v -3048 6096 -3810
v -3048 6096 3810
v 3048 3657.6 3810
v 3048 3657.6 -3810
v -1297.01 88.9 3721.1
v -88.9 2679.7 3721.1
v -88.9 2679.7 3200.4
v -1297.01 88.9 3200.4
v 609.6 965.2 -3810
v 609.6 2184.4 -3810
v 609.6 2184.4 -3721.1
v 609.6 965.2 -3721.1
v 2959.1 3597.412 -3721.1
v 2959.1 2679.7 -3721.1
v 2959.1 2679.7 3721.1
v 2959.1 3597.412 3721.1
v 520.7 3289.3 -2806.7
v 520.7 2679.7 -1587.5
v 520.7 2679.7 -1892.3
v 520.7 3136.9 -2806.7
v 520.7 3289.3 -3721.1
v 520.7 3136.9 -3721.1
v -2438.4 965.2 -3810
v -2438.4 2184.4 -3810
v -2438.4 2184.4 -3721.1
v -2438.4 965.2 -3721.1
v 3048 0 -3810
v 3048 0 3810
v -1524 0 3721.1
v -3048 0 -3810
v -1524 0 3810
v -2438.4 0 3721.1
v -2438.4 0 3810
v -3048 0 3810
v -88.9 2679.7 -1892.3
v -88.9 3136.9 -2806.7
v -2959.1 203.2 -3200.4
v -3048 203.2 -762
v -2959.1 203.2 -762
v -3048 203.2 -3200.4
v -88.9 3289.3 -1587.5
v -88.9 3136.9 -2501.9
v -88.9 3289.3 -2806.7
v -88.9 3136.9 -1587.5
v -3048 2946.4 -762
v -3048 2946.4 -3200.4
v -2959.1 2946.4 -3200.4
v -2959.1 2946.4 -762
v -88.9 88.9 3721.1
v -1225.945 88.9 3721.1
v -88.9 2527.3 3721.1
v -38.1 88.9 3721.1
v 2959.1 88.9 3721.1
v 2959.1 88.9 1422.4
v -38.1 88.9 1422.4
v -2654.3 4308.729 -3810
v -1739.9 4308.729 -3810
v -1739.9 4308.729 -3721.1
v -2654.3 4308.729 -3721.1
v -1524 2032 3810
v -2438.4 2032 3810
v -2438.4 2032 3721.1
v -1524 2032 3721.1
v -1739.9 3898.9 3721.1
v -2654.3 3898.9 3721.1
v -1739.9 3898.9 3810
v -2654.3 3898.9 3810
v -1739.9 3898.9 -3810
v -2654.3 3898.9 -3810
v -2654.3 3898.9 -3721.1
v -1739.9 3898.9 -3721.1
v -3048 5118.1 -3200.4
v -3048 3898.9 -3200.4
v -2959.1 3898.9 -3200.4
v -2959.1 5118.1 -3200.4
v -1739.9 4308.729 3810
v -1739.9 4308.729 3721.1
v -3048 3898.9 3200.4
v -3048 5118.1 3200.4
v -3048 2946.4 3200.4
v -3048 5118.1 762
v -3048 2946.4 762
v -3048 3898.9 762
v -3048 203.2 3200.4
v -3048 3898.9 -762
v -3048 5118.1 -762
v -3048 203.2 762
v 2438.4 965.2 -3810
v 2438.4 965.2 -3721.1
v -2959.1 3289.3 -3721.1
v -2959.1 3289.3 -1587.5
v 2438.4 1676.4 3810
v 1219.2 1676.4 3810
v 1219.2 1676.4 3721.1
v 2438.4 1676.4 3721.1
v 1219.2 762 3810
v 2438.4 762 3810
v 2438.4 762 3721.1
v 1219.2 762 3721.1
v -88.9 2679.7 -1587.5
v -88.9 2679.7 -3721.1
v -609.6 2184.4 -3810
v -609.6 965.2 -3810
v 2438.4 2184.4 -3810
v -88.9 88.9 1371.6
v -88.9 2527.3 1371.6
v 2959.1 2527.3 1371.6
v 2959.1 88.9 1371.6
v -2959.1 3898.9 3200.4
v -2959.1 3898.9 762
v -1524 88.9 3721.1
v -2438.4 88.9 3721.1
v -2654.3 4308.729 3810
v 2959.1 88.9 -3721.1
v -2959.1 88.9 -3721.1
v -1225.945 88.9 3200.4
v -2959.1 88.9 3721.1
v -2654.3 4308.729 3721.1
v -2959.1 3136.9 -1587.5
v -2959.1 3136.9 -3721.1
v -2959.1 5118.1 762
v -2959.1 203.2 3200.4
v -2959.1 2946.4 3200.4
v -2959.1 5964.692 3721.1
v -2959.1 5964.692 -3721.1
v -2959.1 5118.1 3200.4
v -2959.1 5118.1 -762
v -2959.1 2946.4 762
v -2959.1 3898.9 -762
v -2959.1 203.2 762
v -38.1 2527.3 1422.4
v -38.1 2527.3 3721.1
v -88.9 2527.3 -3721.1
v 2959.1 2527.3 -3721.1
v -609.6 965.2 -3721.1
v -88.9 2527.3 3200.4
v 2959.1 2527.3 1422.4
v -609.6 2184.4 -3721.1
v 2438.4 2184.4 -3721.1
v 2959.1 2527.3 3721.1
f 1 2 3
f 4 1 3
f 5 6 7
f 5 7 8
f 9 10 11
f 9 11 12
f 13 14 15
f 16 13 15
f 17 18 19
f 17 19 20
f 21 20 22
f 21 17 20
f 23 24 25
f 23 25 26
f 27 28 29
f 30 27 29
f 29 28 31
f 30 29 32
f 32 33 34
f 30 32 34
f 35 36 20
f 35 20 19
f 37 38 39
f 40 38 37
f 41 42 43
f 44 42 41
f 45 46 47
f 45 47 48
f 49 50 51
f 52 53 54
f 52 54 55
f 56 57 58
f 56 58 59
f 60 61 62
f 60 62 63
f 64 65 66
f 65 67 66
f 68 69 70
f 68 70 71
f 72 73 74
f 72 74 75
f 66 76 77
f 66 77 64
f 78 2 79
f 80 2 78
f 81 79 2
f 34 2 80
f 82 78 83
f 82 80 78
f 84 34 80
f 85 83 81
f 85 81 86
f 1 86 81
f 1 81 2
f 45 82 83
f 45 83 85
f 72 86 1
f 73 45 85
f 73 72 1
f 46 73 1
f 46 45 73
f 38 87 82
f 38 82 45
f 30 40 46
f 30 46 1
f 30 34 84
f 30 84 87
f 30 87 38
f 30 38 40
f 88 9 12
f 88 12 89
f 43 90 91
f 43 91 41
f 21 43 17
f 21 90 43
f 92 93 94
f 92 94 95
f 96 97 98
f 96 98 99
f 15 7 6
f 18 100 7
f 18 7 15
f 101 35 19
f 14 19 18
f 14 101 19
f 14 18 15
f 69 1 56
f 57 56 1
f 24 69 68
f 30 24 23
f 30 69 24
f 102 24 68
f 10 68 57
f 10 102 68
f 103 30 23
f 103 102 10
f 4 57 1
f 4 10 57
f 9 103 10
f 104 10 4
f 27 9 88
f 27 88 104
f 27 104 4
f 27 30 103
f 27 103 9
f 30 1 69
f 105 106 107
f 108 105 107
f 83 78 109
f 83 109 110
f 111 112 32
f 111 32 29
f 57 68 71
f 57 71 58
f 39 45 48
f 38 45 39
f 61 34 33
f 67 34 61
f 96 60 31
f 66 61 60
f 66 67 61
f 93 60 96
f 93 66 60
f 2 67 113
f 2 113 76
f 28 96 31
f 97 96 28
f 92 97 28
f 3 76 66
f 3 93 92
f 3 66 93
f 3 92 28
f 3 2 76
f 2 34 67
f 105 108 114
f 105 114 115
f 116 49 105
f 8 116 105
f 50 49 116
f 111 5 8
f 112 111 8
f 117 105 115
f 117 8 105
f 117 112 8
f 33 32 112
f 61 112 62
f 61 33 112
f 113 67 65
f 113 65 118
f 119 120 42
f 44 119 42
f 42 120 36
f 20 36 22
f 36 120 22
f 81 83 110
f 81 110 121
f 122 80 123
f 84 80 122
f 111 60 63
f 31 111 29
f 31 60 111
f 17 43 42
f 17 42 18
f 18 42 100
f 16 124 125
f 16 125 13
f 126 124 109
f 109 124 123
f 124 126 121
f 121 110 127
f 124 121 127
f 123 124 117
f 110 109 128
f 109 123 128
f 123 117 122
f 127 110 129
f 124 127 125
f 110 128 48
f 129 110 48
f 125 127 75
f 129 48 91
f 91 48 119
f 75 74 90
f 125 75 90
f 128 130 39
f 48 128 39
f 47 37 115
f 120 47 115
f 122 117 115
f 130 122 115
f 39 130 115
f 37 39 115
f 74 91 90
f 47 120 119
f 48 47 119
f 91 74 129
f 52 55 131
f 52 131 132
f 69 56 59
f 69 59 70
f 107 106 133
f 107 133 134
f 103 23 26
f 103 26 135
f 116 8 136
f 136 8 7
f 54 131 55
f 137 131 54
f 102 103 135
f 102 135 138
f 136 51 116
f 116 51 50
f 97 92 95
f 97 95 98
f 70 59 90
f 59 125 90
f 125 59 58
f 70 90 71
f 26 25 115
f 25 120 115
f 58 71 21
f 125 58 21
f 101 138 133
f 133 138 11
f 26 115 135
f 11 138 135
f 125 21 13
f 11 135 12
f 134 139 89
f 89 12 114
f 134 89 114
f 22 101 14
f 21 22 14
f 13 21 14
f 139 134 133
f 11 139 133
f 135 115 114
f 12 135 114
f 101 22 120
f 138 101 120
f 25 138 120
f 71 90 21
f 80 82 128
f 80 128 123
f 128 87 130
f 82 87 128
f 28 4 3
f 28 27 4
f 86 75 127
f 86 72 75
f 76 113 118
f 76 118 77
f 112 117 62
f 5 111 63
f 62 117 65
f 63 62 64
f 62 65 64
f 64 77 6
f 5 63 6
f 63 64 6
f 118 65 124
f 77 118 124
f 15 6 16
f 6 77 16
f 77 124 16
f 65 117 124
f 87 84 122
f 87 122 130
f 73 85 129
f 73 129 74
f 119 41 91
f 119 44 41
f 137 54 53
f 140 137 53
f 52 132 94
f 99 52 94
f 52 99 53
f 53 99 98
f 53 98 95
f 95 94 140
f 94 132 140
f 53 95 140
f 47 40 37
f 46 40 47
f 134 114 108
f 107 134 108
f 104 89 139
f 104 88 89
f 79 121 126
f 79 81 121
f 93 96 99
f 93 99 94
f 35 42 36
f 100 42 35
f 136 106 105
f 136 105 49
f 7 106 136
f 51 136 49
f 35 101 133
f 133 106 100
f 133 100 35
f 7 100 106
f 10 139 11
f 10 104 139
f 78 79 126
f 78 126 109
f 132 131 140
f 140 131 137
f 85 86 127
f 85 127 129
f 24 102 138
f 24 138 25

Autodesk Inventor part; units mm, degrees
ref_plane "YZ Plane" through (0, 0, 0) normal (1, 0, 0) x (0, 1, 0)
sketch "Sketch1" plane through (0, 0, 0) normal (0, 1, 0) x (-1, 0, 0)
  line L0 (-3048, 3810) -> (3048, 3810)
  line L1 (3048, 3810) -> (3048, -3810)
  line L2 (3048, -3810) -> (-3048, -3810)
  line L3 (-3048, -3810) -> (-3048, 3810)
  line L4 (-3048, 3810) -> (3048, -3810) construction
  line L5 (3048, 3810) -> (-3048, -3810) construction
  point P0 (0, 0)
  dimension "d0" = 7620
  dimension "d1" = 6096
extrude "main body" add sketch "Sketch1" along normal blind 3657.6
sketch "Sketch3" plane through (0, 0, 0) normal (0, 0, 1) x (1, 0, 0)
  line L0 (-3048, 3657.6) -> (-3048, 6096)
  line L1 (-3048, 6096) -> (3048, 3657.6)
  line L2 (3048, 3657.6) -> (-3048, 3657.6)
  point P0 (0, 0)
  dimension "d4" = 2438.4
extrude "triangle" add sketch "Sketch3" along normal mid plane 7620
shell "Shell1" thickness 88.9 removed faces 1 at (-1016, 3251.2, 3810)
ref_plane "Work Plane1" through (-2959.1, 2527.3, 3810) normal (0, 1, 0) x (1, 0, 0)
sketch "Sketch6" plane through (-2959.1, 2527.3, 3810) normal (0, 1, 0) x (1, 0, 0)
  line L0 (5918.2, 0) -> (2870.2, 0)
  line L1 (2870.2, 0) -> (2870.2, 7531.1)
  line L2 (2870.2, 7531.1) -> (5918.2, 7531.1)
  line L3 (5918.2, 7531.1) -> (5918.2, 0)
  point P0 (2959.1, 3810)
  dimension "d12" = 3048
extrude "second floor" add sketch "Sketch6" along normal blind 152.4
ref_plane "Work Plane3" through (-2959.1, 3136.9, 3810) normal (0, 1, 0) x (1, 0, 0)
sketch "Sketch8" plane through (-2959.1, 3136.9, 3810) normal (0, 1, 0) x (1, 0, 0)
  line L0 (0, 7531.1) -> (2870.2, 7531.1)
  line L1 (2870.2, 7531.1) -> (2870.2, 5397.5)
  line L2 (2870.2, 5397.5) -> (0, 5397.5)
  line L3 (0, 5397.5) -> (0, 7531.1)
  line L4 (2870.2, 7531.1) -> (2870.2, 0) projected
  line L5 (0, 0) -> (0, 7531.1) projected
  line L6 (2870.2, 7531.1) -> (3479.8, 7531.1)
  line L7 (3479.8, 7531.1) -> (3479.8, 6616.7)
  line L8 (3479.8, 6616.7) -> (2870.2, 6616.7)
  line L9 (2870.2, 6616.7) -> (2870.2, 7531.1)
  point P0 (2959.1, 3810)
  dimension "d17" = 0
  dimension "d19" = 0
  dimension "d20" = 2133.6
  dimension "d23" = 0
  dimension "d39" = 609.6
  dimension "d40" = 914.4
extrude "bedroom" add sketch "Sketch8" along normal blind 152.4
sketch "Sketch16" plane through (-88.9, 3136.9, -1587.5) normal (1, 0, 0) x (0, 0, -1)
  line L0 (1219.2, 0) -> (304.8, -457.2)
  line L1 (1219.2, 0) -> (1219.2, 152.4) projected
  line L2 (2133.6, -457.2) -> (-5397.5, -457.2) projected
  line L3 (0, 0) -> (0, 152.4) projected
  line L4 (1219.2, 152.4) -> (0, -457.2)
  line L5 (2133.6, -457.2) -> (-5397.5, -457.2) projected
  line L6 (304.8, -457.2) -> (0, -457.2)
  line L7 (1219.2, 152.4) -> (1219.2, 0)
  point P0 (-1587.5, -3136.9)
  point P1 (-1803.4, -558.8)
  point P2 (-5397.5, -457.2)
  dimension "d42" = 0
extrude "upper stairs" add sketch "Sketch16" along normal blind 609.6
sketch "Sketch17" plane through (-3048, 0, 3810) normal (0, 0, 1) x (1, 0, 0)
  line L0 (2959.1, 2527.3) -> (1822.0554, 88.9)
  line L1 (6007.1, 88.9) -> (88.9, 88.9) projected
  line L2 (2959.1, 2679.7) -> (1750.9901, 88.9)
  line L3 (6007.1, 2527.3) -> (2959.1, 2527.3) projected
  line L4 (3022.6, 2527.3) -> (3022.6, 25.4) projected
  line L5 (2959.1, 2679.7) -> (2959.1, 2527.3)
  line L6 (1750.9901, 88.9) -> (1822.0554, 88.9)
  line L7 (2959.1, 2679.7) -> (6007.1, 2679.7) projected
  line L8 (2959.1, 2527.3) -> (2959.1, 2679.7) projected
  line L9 (2959.1, 2679.7) -> (2959.1, 2527.3)
  point P0 (3048, 0)
  point P1 (88.9, 88.9)
  point P2 (3022.6, 25.4)
  dimension "d46" = 115
extrude "main stairs" add sketch "Sketch17" against normal blind 609.6 contours L0 L1 L2 L5
sketch "Sketch18" plane through (2959.1, 88.9, -3721.1) normal (-1, 0, 0) x (0, 0, 1)
  point P0 (3721.1, -88.9)
ref_plane "Work Plane4" through (0, 0, 1371.6) normal (0, 0, 1) x (1, 0, 0)
sketch "Sketch20" plane through (0, 0, 1371.6) normal (0, 0, 1) x (1, 0, 0)
  line L0 (2959.1, 2527.3) -> (-88.9, 2527.3) projected
  line L1 (2959.1, 88.9) -> (2959.1, 2527.3) projected
  line L2 (-88.9, 2527.3) -> (2959.1, 2527.3)
  line L3 (2959.1, 2527.3) -> (2959.1, 88.9)
  line L4 (2959.1, 88.9) -> (-88.9, 88.9)
  line L5 (-88.9, 88.9) -> (-88.9, 2527.3)
  point P0 (0, 0)
extrude "room wall 1" add sketch "Sketch20" along normal blind 50.8
sketch "Sketch21" plane through (-88.9, 2679.7, -3721.1) normal (-1, 0, 0) x (0, 0, 1)
  line L0 (7531.1, -152.4) -> (5143.5, -152.4) projected
  line L1 (5143.5, -2590.8) -> (7531.1, -2590.8) projected
  line L2 (5143.5, -152.4) -> (7531.1, -152.4)
  line L3 (7531.1, -152.4) -> (7531.1, -2590.8)
  line L4 (7531.1, -2590.8) -> (5143.5, -2590.8)
  line L5 (5143.5, -2590.8) -> (5143.5, -152.4)
  line L6 (6921.5, -2590.8) -> (6921.5, 0) projected
  line L7 (5143.5, -152.4) -> (5143.5, -2590.8) projected
  point P0 (3721.1, -2679.7)
extrude "room wall 2" add sketch "Sketch21" against normal blind 50.8
sketch "Sketch23" plane through (-3048, 0, 3810) normal (0, 0, 1) x (1, 0, 0)
  line L0 (0, 0) -> (0, 6096) projected
  line L1 (6096, 0) -> (6096, 3657.6) projected
  line L2 (0, 6096) -> (6096, 3657.6)
  line L3 (6096, 3657.6) -> (6096, 0)
  line L4 (6096, 0) -> (0, 0) projected
  line L5 (6096, 0) -> (0, 0)
  line L6 (6096, 3657.6) -> (0, 6096) projected
  line L7 (0, 0) -> (0, 6096)
  line L8 (1750.9901, 88.9) -> (88.9, 88.9) projected
  point P0 (3048, 0)
  point P1 (88.9, 5964.6918)
  point P2 (6007.1, 3597.4118)
  point P3 (6007.1, 88.9)
extrude "outer wall" [suppressed]
sketch "Sketch24" plane through (-3048, 0, -3810) normal (-1, 0, 0) x (0, 0, 1)
  line L0 (609.6, 2946.4) -> (3048, 2946.4)
  line L1 (3048, 2946.4) -> (3048, 203.2)
  line L2 (3048, 203.2) -> (609.6, 203.2)
  line L3 (609.6, 203.2) -> (609.6, 2946.4)
  line L4 (7620, 0) -> (0, 0) projected
  line L5 (0, 0) -> (0, 6096) projected
  line L6 (7620, 0) -> (7620, 6096) projected
  line L7 (4572, 2946.4) -> (7010.4, 2946.4)
  line L8 (7010.4, 2946.4) -> (7010.4, 203.2)
  line L9 (7010.4, 203.2) -> (4572, 203.2)
  line L10 (4572, 203.2) -> (4572, 2946.4)
  line L11 (2222.5, 3289.3) -> (88.9, 3289.3) projected
  point P0 (3810, 0)
  point P1 (3810, 0)
  dimension "d62" = 203.2
  dimension "d63" = 2438.4
  dimension "d64" = 609.6
  dimension "d65" = 2743.2
  dimension "d73" = 203.2
  dimension "d74" = 609.6
sketch "Sketch26" plane through (3048, 0, -3810) normal (0, 0, -1) x (-1, 0, 0)
  line L0 (4787.9, 4308.729) -> (5702.3, 4308.729)
  line L1 (5702.3, 4308.729) -> (5702.3, 3898.9)
  line L2 (5702.3, 3898.9) -> (4787.9, 3898.9)
  line L3 (4787.9, 3898.9) -> (4787.9, 4308.729)
  line L4 (3136.9, 3136.9) -> (6007.1, 3136.9) projected
  line L5 (6007.1, 3289.3) -> (6007.1, 5964.6918) projected
  line L6 (6007.1, 3289.3) -> (2527.3, 3289.3) projected
  point P0 (3048, 0)
  dimension "d78" = 914.4
  dimension "d79" = 409.829
  dimension "d81" = 304.8
  dimension "d95" = 609.6
extrude "side window 1" cut sketch "Sketch26" against normal up to next
sketch "Sketch30" plane through (-3048, 0, -3810) normal (-1, 0, 0) x (0, 0, 1)
  line L0 (609.6, 5118.1) -> (3048, 5118.1)
  line L1 (3048, 5118.1) -> (3048, 3898.9)
  line L2 (3048, 3898.9) -> (609.6, 3898.9)
  line L3 (609.6, 3898.9) -> (609.6, 5118.1)
  line L4 (0, 4308.729) -> (0, 3898.9) projected
  line L5 (2222.5, 3289.3) -> (88.9, 3289.3) projected
  line L6 (0, 0) -> (0, 6096) projected
  line L7 (7620, 0) -> (7620, 6096) projected
  line L8 (4572, 3898.9) -> (4572, 5118.1)
  line L9 (4572, 5118.1) -> (7010.4, 5118.1)
  line L10 (7010.4, 5118.1) -> (7010.4, 3898.9)
  line L11 (7010.4, 3898.9) -> (4572, 3898.9)
  point P0 (3810, 0)
  dimension "d105" = 2438.4
  dimension "d106" = 609.6
  dimension "d107" = 609.6
  dimension "d118" = 1219.2
  dimension "d121" = 3962.4
sketch "Sketch28" plane through (-3048, 0, 3810) normal (0, 0, 1) x (1, 0, 0)
  line L0 (0, 0) -> (0, 6096) projected
  line L1 (0, 6096) -> (6096, 3657.6) projected
  line L2 (0, 6096) -> (6096, 3657.6)
  line L3 (6096, 0) -> (0, 0) projected
  line L4 (6096, 3657.6) -> (6096, 0)
  line L5 (6096, 0) -> (0, 0)
  line L6 (0, 0) -> (0, 6096)
  point P0 (3048, 0)
extrude "my WALL" add sketch "Sketch28" against normal blind 88.9
sketch "Sketch29" plane through (-3048, 0, 3810) normal (0, 0, 1) x (1, 0, 0)
  line L0 (393.7, 3898.9) -> (393.7, 4308.729) projected
  line L1 (393.7, 3898.9) -> (1308.1, 3898.9) projected
  line L2 (393.7, 4308.729) -> (1308.1, 4308.729)
  line L3 (1308.1, 4308.729) -> (1308.1, 3898.9)
  line L4 (1308.1, 3898.9) -> (393.7, 3898.9)
  line L5 (393.7, 3898.9) -> (393.7, 4308.729)
  point P0 (3048, 0)
extrude "other side window 1" cut sketch "Sketch29" against normal up to next
extrude "front bottom windows" cut sketch "Sketch24" against normal up to next
extrude "front top windows" cut sketch "Sketch30" against normal up to next
sketch "Sketch31" plane through (3048, 0, -3810) normal (0, 0, -1) x (-1, 0, 0)
  line L0 (3657.6, 2184.4) -> (5486.4, 2184.4)
  line L1 (5486.4, 2184.4) -> (5486.4, 965.2)
  line L2 (5486.4, 965.2) -> (3657.6, 965.2)
  line L3 (3657.6, 965.2) -> (3657.6, 2184.4)
  line L4 (6096, 0) -> (0, 0) projected
  line L5 (6096, 0) -> (6096, 6096) projected
  line L6 (609.6, 2184.4) -> (2438.4, 2184.4)
  line L7 (2438.4, 2184.4) -> (2438.4, 965.2)
  line L8 (2438.4, 965.2) -> (609.6, 965.2)
  line L9 (609.6, 965.2) -> (609.6, 2184.4)
  line L10 (0, 0) -> (0, 3657.6) projected
  point P0 (3048, 0)
  dimension "d132" = 1219.2
  dimension "d133" = 1828.8
  dimension "d134" = 965.2
  dimension "d135" = 609.6
  dimension "d136" = 609.6
  dimension "d137" = 965.2
extrude "Extrusion27" cut sketch "Sketch31" against normal up to next
sketch "Sketch32" plane through (-3048, 0, 3810) normal (0, 0, 1) x (1, 0, 0)
  line L0 (609.6, 2032) -> (1524, 2032)
  line L1 (1524, 2032) -> (1524, 0)
  line L2 (1524, 0) -> (609.6, 0)
  line L3 (609.6, 0) -> (609.6, 2032)
  line L4 (6096, 0) -> (0, 0) projected
  line L5 (0, 0) -> (0, 6096) projected
  point P0 (3048, 0)
  point P1 (3048, 0)
  dimension "d140" = 2032
  dimension "d141" = 914.4
  dimension "d142" = 609.6
extrude "Extrusion28" cut sketch "Sketch32" against normal blind 88.9
sketch "Sketch33" plane through (-3048, 0, 3810) normal (0, 0, 1) x (1, 0, 0)
  line L0 (4267.2, 1676.4) -> (5486.4, 1676.4)
  line L1 (5486.4, 1676.4) -> (5486.4, 762)
  line L2 (5486.4, 762) -> (4267.2, 762)
  line L3 (4267.2, 762) -> (4267.2, 1676.4)
  line L4 (6096, 0) -> (6096, 3657.6) projected
  line L5 (6096, 0) -> (1524, 0) projected
  point P0 (3048, 0)
  dimension "d145" = 1219.2
  dimension "d146" = 914.4
  dimension "d147" = 609.6
  dimension "d148" = 762
extrude "Extrusion29" cut sketch "Sketch33" against normal up to next
equation "\"d73\" = d62"
equation "\"d137\" = d134"
properties part number "out"
